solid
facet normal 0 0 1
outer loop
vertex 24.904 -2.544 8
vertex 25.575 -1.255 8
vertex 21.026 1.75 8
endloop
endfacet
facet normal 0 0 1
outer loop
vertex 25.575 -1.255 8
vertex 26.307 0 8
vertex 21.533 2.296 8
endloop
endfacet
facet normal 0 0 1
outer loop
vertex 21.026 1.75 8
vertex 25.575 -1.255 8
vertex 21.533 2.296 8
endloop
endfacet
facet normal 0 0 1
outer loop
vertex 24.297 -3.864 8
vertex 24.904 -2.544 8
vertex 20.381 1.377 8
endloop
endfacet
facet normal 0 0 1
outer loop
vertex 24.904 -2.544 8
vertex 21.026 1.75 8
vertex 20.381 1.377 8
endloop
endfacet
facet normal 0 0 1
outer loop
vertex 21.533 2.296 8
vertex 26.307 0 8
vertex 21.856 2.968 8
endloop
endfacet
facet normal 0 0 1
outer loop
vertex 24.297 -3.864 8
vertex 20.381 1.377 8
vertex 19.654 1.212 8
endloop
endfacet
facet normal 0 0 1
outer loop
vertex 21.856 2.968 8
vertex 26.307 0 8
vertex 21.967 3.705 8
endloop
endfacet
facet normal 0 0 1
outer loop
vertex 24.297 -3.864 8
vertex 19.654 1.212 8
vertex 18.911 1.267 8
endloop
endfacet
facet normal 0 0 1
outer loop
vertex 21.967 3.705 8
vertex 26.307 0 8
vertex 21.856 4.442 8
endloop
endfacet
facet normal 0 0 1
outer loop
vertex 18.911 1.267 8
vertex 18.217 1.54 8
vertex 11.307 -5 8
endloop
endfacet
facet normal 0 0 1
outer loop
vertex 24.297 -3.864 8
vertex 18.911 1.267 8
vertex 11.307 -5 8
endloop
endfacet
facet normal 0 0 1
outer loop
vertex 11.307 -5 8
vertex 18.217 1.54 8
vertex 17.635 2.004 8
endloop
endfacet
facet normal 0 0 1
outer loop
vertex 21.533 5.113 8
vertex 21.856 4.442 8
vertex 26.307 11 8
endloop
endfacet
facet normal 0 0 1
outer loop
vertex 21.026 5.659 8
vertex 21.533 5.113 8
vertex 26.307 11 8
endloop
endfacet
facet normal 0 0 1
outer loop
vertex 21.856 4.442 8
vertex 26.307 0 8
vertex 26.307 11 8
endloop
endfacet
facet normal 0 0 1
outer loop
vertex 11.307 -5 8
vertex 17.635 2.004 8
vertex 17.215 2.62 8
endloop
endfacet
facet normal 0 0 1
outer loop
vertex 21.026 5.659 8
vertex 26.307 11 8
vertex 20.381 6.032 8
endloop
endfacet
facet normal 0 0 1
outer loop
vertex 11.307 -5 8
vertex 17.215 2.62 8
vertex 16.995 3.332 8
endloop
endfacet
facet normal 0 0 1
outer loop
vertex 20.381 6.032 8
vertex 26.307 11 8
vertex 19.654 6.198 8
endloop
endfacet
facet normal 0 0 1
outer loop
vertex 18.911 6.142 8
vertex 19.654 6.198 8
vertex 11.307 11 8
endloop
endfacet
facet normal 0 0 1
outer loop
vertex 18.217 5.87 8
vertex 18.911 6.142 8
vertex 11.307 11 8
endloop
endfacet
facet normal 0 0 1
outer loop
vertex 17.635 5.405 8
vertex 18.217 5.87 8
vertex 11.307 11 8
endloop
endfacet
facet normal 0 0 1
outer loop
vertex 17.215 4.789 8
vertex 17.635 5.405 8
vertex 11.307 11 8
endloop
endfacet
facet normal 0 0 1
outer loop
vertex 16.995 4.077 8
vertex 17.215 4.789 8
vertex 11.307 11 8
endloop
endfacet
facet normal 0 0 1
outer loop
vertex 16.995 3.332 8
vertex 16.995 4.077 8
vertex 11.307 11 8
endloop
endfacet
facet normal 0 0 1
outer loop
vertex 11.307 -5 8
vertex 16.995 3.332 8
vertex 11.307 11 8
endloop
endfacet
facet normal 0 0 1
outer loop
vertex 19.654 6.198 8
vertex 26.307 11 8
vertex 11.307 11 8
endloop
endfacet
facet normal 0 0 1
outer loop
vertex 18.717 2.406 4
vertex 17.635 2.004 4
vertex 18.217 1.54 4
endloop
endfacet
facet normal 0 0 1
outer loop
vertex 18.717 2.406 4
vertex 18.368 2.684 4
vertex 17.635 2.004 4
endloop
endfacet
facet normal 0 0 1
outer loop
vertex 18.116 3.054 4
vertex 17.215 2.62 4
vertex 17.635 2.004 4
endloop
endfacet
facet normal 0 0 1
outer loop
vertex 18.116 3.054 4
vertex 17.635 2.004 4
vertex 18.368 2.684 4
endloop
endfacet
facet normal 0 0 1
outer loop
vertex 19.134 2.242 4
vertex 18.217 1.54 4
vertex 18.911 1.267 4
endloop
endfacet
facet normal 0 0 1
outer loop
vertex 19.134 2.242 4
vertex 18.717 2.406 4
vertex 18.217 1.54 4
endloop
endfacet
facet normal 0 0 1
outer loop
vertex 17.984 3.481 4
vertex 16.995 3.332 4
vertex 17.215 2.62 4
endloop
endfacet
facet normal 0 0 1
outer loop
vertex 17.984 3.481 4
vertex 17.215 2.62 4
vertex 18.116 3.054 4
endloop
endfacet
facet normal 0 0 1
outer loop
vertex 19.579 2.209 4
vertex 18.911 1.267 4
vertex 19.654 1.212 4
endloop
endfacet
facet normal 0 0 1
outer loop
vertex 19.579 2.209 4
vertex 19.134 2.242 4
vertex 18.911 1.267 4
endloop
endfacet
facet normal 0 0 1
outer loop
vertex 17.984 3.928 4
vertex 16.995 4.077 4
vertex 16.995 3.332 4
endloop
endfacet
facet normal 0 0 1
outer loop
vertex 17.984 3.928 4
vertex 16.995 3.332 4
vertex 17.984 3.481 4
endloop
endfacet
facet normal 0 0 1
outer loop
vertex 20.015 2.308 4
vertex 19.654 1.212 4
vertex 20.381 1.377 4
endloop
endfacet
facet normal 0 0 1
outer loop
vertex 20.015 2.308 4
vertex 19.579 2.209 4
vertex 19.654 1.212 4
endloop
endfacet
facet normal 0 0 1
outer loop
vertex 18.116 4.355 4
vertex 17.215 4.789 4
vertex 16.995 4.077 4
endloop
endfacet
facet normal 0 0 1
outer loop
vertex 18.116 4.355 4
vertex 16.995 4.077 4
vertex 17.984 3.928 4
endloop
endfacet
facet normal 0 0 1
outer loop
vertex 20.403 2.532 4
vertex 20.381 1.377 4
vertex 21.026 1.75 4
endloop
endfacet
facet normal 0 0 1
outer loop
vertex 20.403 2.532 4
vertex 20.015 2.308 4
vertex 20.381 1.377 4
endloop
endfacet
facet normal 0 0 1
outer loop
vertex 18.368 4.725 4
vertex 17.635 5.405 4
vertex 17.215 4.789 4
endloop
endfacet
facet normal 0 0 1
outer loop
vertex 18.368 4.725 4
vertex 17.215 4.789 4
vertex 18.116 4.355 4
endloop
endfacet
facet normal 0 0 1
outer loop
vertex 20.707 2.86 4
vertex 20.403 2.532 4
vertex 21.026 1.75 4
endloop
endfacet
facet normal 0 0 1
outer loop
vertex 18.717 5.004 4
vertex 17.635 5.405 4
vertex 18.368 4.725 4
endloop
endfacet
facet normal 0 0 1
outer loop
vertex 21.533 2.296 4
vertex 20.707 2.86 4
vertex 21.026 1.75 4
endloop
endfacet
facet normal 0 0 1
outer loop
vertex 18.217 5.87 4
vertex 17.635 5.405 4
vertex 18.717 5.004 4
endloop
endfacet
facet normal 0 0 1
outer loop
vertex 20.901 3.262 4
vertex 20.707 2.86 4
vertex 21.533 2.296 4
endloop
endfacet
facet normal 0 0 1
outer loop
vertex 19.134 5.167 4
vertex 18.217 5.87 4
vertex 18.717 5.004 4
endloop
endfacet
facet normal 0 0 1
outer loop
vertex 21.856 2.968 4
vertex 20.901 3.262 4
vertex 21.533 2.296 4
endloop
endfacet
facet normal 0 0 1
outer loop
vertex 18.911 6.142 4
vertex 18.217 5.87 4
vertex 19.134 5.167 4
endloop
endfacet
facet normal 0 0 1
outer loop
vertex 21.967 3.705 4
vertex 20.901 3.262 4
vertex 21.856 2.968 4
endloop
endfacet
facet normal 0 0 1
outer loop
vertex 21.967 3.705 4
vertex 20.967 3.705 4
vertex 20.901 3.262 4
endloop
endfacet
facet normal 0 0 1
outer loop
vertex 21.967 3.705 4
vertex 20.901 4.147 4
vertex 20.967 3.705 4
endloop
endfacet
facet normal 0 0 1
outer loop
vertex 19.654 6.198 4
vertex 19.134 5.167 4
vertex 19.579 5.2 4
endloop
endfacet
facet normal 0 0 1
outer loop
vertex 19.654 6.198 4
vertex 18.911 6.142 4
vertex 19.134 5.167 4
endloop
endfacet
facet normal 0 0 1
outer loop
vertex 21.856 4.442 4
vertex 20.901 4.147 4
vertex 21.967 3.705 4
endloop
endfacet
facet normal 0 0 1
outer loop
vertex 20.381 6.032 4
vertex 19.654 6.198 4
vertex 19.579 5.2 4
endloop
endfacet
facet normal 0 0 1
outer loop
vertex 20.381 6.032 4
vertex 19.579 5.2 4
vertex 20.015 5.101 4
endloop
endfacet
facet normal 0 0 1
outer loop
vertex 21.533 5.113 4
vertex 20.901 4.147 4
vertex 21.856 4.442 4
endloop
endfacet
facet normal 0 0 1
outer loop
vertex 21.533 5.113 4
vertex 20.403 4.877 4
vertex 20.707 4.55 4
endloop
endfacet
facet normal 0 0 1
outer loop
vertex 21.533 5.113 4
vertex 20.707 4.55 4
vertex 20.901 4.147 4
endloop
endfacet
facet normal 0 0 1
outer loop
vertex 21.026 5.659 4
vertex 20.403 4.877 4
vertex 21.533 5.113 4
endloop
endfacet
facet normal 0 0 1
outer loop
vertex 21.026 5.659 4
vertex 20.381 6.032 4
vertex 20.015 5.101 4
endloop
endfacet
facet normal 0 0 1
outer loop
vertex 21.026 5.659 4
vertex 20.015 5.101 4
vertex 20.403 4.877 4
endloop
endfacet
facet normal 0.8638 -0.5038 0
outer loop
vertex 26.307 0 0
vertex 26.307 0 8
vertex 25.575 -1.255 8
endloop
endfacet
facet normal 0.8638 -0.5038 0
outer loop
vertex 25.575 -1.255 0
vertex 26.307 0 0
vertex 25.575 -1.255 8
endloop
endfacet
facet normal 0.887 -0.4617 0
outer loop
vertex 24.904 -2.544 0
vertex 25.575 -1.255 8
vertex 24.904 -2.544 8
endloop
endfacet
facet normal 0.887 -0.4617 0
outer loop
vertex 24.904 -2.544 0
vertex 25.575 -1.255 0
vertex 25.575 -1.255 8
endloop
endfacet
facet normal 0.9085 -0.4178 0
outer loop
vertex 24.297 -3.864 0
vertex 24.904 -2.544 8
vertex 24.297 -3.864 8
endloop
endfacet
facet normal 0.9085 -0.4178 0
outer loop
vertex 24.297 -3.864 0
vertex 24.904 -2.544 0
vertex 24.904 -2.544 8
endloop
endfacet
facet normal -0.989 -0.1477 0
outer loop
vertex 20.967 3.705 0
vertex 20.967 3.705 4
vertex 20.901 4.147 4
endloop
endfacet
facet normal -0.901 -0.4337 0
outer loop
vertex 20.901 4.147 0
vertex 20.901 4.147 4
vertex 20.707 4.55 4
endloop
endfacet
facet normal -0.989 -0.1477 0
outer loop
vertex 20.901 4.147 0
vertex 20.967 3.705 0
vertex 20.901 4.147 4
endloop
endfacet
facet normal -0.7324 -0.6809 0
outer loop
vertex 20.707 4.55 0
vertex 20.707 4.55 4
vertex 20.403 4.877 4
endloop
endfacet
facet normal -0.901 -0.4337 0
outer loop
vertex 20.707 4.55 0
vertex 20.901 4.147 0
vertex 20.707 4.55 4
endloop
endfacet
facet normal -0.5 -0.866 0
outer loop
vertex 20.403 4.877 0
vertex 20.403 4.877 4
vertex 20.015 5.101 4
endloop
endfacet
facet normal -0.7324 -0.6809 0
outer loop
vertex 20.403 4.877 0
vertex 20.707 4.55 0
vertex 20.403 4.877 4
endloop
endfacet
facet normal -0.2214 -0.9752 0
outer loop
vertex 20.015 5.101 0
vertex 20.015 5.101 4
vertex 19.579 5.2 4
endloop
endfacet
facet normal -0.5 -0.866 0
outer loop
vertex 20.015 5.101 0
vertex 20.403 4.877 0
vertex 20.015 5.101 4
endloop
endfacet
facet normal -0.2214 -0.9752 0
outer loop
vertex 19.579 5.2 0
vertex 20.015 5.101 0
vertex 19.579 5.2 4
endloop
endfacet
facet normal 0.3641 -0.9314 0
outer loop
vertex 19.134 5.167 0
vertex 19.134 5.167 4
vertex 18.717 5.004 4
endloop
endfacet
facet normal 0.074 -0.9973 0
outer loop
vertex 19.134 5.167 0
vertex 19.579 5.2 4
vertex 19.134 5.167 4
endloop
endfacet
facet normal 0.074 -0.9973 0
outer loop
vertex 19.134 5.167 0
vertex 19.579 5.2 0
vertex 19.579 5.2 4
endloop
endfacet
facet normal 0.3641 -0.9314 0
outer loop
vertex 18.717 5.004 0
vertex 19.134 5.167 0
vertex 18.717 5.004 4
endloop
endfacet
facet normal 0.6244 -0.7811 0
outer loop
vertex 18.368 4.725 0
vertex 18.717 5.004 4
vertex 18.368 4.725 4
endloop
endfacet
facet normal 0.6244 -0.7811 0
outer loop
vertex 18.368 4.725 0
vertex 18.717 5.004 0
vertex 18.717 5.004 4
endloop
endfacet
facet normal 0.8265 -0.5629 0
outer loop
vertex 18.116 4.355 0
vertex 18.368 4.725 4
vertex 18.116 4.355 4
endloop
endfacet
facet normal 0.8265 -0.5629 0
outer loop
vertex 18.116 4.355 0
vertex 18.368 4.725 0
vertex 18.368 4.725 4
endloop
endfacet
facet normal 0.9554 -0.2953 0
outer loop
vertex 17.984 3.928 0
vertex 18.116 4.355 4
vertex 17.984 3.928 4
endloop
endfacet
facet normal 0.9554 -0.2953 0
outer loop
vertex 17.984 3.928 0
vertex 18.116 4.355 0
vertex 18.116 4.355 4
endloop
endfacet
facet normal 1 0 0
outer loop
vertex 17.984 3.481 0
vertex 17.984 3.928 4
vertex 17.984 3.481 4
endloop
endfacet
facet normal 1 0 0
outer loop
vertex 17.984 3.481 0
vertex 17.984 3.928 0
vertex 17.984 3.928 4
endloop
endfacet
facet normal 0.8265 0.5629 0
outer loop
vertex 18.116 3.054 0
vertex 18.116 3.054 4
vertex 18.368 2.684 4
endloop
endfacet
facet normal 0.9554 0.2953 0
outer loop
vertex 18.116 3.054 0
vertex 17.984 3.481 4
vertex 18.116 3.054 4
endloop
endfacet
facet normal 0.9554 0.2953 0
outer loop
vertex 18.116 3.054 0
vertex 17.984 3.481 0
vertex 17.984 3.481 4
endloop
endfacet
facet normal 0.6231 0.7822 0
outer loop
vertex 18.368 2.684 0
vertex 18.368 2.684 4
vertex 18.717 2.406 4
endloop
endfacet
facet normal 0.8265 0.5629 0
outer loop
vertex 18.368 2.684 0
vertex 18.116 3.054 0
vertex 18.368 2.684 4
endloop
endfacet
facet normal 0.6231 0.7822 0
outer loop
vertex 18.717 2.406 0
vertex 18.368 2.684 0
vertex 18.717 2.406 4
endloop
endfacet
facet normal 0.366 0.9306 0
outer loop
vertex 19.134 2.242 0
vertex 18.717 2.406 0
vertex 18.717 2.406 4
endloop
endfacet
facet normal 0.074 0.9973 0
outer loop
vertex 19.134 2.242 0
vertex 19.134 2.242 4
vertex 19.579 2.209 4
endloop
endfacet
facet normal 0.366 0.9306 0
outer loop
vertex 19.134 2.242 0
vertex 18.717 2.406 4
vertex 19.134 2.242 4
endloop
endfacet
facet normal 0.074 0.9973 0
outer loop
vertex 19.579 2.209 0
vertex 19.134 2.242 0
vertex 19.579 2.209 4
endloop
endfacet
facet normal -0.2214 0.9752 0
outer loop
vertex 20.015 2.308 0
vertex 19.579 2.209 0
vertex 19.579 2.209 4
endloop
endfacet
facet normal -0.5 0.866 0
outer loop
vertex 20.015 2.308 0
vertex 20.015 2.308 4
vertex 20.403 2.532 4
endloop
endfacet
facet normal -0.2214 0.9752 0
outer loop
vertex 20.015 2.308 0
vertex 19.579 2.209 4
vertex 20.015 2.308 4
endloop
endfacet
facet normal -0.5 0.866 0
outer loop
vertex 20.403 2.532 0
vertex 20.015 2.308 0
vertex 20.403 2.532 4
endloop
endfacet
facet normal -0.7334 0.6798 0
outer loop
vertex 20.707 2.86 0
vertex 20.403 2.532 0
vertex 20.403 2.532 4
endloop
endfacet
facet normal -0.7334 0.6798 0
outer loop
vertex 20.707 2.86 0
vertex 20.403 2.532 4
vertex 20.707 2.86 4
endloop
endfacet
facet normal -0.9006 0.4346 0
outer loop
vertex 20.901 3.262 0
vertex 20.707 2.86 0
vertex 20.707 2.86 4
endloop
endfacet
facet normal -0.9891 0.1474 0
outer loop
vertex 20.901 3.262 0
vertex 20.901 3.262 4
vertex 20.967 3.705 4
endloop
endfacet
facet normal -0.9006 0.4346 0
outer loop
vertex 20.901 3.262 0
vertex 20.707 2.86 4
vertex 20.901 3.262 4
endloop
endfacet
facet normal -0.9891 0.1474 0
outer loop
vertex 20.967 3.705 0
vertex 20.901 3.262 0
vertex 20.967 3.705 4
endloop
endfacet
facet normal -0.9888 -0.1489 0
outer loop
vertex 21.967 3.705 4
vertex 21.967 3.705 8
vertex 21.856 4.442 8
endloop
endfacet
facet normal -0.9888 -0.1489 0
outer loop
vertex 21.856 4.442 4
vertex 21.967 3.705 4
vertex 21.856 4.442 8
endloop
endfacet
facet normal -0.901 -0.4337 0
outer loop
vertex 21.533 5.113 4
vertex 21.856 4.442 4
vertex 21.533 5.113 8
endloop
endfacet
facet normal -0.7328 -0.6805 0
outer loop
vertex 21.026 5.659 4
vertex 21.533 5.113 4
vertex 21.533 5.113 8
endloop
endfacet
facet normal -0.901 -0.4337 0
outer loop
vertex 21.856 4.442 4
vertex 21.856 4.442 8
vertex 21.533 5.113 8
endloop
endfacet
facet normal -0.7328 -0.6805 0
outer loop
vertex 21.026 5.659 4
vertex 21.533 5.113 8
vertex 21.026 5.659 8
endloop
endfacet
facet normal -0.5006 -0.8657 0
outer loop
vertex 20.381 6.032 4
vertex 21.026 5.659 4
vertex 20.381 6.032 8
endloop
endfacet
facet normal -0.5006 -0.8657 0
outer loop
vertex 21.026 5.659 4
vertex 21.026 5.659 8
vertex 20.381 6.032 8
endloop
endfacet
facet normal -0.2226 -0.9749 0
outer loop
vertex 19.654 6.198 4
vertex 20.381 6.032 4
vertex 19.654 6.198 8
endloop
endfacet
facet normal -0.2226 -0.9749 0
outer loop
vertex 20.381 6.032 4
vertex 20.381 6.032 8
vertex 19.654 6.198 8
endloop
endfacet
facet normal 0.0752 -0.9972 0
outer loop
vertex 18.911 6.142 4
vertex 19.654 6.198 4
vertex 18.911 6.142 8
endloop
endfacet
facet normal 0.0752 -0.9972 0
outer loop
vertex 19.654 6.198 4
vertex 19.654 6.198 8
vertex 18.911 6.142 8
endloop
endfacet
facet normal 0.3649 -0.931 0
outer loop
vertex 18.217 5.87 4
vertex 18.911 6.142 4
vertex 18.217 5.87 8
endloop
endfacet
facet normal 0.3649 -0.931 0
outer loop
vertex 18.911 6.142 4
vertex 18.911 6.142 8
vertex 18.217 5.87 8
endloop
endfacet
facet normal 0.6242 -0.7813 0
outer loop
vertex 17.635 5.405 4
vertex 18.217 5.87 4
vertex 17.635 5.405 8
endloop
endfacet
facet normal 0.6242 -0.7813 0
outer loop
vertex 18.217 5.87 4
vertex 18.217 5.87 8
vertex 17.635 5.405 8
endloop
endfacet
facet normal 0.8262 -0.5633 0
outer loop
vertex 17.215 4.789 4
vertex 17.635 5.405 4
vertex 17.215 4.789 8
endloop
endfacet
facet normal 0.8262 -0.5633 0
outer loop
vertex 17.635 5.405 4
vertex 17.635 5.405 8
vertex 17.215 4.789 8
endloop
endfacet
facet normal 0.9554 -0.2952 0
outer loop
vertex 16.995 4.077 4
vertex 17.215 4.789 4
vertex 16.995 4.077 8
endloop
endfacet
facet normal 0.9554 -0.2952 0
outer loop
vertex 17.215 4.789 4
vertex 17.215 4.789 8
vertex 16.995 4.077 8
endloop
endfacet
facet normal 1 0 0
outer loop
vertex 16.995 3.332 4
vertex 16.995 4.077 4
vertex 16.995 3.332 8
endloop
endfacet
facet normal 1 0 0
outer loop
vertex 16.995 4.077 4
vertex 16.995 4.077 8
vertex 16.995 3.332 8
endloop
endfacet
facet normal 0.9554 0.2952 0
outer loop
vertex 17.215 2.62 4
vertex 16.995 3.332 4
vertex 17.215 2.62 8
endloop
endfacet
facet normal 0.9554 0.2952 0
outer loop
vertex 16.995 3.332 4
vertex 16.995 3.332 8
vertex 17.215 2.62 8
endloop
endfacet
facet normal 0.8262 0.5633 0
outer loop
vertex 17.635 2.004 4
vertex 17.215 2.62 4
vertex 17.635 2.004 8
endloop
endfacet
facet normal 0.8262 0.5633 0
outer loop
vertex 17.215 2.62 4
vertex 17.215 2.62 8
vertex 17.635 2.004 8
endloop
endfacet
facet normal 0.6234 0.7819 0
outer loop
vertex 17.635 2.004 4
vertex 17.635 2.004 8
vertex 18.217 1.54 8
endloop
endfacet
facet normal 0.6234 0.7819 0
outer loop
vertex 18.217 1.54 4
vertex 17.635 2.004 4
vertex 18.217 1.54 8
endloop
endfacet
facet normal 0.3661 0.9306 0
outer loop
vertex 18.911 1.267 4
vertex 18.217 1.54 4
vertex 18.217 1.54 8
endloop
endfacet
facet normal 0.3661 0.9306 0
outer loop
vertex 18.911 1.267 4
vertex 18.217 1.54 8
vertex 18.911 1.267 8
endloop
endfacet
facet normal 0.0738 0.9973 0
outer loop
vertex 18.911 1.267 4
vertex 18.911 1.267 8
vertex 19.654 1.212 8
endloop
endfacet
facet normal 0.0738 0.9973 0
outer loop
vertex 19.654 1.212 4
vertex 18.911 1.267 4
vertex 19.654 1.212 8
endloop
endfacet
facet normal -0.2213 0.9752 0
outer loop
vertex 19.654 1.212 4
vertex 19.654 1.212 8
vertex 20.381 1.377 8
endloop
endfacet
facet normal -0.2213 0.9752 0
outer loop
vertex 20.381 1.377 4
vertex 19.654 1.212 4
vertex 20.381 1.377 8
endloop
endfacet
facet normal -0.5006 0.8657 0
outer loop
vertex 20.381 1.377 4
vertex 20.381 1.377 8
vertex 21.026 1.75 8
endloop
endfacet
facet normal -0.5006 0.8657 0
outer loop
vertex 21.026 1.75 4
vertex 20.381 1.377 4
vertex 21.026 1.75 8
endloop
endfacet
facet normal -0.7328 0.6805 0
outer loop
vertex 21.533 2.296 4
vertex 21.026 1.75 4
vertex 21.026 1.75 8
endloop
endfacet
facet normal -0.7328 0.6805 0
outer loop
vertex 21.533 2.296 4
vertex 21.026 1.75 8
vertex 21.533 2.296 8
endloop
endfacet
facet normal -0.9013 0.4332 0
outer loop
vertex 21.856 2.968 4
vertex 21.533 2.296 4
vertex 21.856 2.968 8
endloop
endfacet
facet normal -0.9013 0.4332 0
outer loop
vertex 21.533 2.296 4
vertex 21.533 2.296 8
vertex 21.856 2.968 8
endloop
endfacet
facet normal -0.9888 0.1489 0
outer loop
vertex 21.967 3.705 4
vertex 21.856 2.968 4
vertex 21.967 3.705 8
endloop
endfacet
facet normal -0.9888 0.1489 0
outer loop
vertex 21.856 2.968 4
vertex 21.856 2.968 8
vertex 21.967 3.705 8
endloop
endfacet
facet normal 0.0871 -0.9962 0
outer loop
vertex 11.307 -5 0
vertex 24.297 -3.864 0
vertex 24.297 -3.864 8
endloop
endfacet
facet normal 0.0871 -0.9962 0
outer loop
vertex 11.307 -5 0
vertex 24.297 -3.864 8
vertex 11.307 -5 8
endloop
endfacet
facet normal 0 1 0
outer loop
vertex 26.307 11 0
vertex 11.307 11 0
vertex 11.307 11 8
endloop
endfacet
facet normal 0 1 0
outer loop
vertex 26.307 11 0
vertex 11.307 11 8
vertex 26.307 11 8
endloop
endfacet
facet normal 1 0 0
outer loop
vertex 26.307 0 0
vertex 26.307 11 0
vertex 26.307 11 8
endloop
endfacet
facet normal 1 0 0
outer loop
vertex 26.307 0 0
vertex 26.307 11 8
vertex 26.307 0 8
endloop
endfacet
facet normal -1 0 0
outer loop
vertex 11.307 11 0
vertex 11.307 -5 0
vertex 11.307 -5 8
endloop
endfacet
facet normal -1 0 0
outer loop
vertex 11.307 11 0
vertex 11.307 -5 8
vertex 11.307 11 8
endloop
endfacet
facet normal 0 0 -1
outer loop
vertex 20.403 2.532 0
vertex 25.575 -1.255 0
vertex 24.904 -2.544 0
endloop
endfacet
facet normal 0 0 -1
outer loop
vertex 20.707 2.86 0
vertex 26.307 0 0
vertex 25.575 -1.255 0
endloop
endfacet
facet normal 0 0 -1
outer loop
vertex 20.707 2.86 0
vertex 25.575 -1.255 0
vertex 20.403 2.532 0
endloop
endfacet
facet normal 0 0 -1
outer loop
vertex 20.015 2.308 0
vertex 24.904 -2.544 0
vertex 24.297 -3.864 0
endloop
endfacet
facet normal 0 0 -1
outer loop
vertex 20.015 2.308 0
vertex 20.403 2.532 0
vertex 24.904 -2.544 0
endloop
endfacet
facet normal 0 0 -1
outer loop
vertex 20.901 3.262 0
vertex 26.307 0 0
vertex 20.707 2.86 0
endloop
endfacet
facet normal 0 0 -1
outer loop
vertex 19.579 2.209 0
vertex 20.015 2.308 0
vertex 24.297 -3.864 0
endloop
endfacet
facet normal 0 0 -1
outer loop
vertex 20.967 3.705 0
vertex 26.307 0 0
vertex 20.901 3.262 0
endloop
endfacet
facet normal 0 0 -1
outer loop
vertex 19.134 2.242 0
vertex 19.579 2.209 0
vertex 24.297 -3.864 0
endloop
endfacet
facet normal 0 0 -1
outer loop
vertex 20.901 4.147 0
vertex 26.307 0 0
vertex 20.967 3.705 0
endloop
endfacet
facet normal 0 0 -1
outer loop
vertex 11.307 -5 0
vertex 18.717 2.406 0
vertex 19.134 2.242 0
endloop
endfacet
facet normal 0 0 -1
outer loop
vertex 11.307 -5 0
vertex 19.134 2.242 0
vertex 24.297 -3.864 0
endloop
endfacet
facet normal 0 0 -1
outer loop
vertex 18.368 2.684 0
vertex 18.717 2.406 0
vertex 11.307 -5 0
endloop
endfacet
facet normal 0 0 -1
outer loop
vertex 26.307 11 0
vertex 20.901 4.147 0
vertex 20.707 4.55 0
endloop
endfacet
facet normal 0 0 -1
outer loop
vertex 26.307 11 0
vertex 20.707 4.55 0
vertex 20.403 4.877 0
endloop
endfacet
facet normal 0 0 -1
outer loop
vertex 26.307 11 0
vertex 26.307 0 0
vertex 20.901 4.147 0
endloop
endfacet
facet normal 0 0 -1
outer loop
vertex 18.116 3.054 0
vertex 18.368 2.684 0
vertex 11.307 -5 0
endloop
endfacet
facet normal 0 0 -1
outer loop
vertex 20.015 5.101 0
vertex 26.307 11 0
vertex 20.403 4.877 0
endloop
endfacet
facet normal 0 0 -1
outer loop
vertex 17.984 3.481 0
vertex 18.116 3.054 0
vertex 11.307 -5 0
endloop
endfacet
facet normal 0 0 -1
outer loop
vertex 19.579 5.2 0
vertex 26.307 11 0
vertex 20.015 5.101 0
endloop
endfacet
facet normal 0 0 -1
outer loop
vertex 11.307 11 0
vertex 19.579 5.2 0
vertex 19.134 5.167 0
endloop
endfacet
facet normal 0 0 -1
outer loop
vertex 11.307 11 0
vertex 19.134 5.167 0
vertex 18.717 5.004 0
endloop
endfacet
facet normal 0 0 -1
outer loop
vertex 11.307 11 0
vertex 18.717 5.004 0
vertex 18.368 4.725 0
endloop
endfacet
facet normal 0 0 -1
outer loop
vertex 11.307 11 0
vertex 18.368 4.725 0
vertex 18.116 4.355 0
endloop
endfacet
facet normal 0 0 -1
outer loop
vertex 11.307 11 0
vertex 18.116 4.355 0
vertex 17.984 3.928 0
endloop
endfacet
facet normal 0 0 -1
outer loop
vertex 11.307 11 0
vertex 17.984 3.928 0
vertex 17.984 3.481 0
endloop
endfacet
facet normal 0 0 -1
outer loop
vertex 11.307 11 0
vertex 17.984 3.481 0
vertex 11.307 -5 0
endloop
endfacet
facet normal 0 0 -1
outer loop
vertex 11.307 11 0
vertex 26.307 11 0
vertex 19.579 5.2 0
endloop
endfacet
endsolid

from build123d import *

# Parameters (mm, degrees)
SKETCH_1_R          = 1.5
EXTRUDE_1_DEPTH     = 8
SKETCH_2_R          = 2.5
CUT_EXTRUDE_1_DEPTH = 4


with BuildPart() as part:
    # 草图1 → 凸台-拉伸1 (new body)
    with BuildSketch(Plane.XY):
        with BuildLine():
            Line((26.30677697, 11), (26.30677697, 0))
            ThreePointArc((26.30677697, 0), (25.231575927, -1.895238991), (24.29677697, -3.863522261))
            Line((24.29677697, -3.863522261), (11.30677697, -5))
            Line((11.30677697, -5), (11.30677697, 11))
            Line((11.30677697, 11), (26.30677697, 11))
        make_face()
        with Locations((19.467365682, 3.704627959)):
            Circle(SKETCH_1_R, mode=Mode.SUBTRACT)
    extrude(amount=EXTRUDE_1_DEPTH)

    # 草图2 → 切除-拉伸1 (cut)
    with BuildSketch(Plane.XY.offset(8)):
        with Locations((19.467365682, 3.704627959)):
            Circle(SKETCH_2_R)
    extrude(amount=-CUT_EXTRUDE_1_DEPTH, mode=Mode.SUBTRACT)


solid = part.part
